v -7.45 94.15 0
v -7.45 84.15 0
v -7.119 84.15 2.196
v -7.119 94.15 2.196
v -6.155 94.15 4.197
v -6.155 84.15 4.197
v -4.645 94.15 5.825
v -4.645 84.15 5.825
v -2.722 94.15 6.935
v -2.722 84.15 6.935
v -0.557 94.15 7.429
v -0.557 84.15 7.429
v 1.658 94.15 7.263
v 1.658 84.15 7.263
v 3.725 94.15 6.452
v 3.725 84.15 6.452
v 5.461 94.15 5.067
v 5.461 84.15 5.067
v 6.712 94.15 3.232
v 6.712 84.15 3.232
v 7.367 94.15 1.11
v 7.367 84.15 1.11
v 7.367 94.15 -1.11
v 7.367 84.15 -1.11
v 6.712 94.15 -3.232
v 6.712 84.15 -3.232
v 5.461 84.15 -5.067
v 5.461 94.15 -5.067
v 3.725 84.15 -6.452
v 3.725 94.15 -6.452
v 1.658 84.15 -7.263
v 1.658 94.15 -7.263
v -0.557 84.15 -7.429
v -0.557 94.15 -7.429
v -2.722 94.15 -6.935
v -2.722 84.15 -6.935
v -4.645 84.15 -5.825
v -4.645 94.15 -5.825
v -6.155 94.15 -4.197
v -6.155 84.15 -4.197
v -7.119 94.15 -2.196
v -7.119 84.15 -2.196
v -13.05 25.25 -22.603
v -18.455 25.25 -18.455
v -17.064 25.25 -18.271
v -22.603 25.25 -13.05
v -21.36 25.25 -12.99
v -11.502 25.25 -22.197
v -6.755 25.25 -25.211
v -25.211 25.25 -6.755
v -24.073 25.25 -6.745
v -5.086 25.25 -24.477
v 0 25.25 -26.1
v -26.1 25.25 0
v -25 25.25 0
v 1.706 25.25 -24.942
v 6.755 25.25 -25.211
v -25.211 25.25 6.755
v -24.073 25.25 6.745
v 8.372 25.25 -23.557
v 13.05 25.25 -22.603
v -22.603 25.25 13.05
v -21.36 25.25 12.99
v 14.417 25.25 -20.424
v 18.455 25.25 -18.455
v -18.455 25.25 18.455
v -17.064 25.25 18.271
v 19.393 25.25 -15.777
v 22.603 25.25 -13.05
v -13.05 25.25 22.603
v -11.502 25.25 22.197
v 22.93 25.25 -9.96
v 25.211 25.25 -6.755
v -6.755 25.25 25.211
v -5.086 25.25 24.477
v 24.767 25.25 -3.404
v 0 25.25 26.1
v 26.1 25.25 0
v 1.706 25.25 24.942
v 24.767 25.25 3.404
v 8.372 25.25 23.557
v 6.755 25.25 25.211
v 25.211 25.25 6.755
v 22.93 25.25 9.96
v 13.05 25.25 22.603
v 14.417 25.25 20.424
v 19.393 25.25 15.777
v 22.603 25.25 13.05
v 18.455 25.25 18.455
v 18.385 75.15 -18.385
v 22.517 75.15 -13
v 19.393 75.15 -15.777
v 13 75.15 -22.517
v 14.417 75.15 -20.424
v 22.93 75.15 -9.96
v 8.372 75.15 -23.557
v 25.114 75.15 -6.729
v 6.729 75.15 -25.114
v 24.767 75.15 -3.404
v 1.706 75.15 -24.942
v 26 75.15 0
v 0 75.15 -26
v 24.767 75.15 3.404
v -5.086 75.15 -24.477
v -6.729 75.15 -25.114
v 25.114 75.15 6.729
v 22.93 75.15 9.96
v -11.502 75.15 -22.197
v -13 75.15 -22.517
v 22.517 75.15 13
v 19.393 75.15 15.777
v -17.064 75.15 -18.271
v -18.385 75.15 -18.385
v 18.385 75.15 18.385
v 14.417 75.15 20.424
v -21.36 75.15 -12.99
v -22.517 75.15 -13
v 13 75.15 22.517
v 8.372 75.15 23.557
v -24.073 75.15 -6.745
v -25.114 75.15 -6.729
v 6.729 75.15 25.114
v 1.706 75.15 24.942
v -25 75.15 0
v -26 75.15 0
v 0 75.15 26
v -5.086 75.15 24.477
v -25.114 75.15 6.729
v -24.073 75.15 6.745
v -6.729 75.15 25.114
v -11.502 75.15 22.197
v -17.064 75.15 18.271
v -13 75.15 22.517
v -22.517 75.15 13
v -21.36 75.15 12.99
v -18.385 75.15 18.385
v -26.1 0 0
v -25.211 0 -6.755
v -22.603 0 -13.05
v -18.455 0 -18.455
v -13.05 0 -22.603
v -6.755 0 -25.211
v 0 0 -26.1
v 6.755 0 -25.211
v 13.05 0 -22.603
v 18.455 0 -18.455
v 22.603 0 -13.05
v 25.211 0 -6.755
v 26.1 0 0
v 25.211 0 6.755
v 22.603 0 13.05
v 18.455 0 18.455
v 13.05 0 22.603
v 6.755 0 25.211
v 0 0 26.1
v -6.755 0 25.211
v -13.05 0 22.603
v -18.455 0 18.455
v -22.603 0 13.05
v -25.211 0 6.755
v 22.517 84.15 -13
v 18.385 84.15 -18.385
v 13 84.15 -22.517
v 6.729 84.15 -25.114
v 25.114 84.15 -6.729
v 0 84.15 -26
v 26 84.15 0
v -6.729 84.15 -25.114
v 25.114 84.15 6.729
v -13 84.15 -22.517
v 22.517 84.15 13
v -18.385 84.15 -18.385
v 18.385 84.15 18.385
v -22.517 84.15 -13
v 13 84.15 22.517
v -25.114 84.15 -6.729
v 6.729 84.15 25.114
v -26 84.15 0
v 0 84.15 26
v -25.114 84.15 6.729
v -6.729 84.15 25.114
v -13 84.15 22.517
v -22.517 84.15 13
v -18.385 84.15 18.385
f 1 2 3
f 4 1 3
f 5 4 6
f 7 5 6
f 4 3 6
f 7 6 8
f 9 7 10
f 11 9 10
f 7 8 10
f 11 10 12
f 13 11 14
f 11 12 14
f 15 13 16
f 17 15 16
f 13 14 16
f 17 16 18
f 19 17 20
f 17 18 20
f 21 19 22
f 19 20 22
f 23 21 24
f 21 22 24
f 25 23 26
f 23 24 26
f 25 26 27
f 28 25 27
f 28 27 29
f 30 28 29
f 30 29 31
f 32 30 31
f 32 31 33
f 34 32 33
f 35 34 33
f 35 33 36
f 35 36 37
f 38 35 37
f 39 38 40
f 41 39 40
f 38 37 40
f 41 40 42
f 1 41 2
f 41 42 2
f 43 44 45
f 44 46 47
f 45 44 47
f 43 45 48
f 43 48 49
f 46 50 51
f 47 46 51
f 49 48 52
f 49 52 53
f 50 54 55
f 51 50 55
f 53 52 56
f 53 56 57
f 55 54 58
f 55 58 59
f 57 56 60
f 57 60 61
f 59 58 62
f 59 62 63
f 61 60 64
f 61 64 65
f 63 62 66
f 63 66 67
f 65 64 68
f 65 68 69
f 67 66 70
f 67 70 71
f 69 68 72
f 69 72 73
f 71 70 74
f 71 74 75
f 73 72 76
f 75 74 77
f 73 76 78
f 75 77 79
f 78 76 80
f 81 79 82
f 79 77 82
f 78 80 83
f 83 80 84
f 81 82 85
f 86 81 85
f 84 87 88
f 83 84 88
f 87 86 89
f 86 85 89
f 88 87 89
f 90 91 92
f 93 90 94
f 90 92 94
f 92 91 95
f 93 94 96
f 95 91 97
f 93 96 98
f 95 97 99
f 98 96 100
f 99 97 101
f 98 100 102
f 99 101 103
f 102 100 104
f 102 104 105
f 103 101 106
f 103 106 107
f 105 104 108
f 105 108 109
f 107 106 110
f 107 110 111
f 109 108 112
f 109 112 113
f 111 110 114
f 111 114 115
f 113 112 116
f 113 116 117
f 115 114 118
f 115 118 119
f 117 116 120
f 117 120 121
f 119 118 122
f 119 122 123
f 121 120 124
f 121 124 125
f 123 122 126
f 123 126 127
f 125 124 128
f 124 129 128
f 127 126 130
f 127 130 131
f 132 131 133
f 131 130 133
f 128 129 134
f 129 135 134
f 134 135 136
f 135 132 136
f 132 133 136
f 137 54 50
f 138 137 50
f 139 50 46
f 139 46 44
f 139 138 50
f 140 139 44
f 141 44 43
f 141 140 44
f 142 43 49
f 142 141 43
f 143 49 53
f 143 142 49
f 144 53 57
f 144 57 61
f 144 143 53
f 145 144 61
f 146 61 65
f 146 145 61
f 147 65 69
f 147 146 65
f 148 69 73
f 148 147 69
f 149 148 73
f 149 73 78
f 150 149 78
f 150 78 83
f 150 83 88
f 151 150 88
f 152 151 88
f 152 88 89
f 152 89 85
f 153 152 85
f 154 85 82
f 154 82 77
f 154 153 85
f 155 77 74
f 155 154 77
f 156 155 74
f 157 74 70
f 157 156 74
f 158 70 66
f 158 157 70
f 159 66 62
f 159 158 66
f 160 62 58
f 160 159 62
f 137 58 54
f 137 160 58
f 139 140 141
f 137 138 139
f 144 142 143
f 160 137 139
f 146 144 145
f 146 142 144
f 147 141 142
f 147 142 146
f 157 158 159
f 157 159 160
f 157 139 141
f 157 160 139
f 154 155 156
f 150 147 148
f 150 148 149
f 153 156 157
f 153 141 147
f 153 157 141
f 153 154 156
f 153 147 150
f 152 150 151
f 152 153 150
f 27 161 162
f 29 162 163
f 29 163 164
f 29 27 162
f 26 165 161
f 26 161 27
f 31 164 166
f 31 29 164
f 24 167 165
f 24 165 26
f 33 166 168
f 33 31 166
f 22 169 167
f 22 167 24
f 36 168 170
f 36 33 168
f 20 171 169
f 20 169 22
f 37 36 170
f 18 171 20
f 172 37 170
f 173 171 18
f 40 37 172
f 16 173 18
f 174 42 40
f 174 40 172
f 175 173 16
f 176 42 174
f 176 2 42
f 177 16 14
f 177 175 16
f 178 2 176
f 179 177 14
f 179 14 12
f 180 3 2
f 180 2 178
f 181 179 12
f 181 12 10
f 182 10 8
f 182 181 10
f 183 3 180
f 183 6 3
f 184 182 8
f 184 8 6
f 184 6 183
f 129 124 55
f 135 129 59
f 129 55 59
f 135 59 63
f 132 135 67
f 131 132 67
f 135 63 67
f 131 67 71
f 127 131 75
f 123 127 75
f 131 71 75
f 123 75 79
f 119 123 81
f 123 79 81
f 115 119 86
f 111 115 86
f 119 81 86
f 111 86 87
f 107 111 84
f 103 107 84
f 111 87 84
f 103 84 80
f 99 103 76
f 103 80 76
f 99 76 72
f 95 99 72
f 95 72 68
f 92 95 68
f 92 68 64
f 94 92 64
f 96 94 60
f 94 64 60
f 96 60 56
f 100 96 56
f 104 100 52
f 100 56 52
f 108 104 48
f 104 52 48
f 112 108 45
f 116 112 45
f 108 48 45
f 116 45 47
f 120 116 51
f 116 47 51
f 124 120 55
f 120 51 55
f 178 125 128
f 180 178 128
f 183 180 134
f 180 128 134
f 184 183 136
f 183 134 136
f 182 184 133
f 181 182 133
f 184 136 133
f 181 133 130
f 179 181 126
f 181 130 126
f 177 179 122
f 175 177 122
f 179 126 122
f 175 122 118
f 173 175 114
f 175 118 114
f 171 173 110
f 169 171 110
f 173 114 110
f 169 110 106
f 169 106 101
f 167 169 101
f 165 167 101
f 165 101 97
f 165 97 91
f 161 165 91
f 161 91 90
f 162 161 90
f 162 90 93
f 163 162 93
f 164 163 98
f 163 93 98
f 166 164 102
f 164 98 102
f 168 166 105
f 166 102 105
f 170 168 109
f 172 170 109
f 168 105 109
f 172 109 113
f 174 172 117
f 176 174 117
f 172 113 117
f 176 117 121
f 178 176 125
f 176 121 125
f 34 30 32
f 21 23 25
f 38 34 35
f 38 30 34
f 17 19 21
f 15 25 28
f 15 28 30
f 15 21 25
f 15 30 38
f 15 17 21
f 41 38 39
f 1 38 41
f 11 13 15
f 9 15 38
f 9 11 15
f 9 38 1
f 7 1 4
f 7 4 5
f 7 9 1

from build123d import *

# Parameters (mm, degrees)
F1_DEPTH = 25.25
F2_R     = 25
F3_DEPTH = 49.9
F4_R     = 26
F5_DEPTH = 9
F6_R     = 7.45
F7_DEPTH = 10


with BuildPart() as f1:
    # F0 (on Front) → F1 (new body)
    with BuildSketch(Plane.XZ):
        with BuildLine():
            Line((0, 0), (26.1, 0))
            ThreePointArc((26.1, 0), (0, 26.1), (-26.1, 0))
            Line((-26.1, 0), (0, 0))
        make_face()
        with BuildLine():
            ThreePointArc((-26.1, 0), (0, -26.1), (26.1, 0))
            Line((26.1, 0), (0, 0))
            Line((0, 0), (-26.1, 0))
        make_face()
    extrude(amount=-F1_DEPTH)

    # F2 (on face) → F3 (join)
    with BuildSketch(Plane(origin=(0, 25.25, 0), x_dir=(-1, 0, 0), z_dir=(0, 1, 0))):
        Circle(F2_R)
    extrude(amount=F3_DEPTH)

    # F4 (on face) → F5 (join)
    with BuildSketch(Plane(origin=(0, 75.15, 0), x_dir=(-1, 0, 0), z_dir=(0, 1, 0))):
        Circle(F4_R)
    extrude(amount=F5_DEPTH)

    # F6 (on face) → F7 (join)
    with BuildSketch(Plane(origin=(0, 84.15, 0), x_dir=(-1, 0, 0), z_dir=(0, 1, 0))):
        Circle(F6_R)
    extrude(amount=F7_DEPTH)


solid = f1.part
